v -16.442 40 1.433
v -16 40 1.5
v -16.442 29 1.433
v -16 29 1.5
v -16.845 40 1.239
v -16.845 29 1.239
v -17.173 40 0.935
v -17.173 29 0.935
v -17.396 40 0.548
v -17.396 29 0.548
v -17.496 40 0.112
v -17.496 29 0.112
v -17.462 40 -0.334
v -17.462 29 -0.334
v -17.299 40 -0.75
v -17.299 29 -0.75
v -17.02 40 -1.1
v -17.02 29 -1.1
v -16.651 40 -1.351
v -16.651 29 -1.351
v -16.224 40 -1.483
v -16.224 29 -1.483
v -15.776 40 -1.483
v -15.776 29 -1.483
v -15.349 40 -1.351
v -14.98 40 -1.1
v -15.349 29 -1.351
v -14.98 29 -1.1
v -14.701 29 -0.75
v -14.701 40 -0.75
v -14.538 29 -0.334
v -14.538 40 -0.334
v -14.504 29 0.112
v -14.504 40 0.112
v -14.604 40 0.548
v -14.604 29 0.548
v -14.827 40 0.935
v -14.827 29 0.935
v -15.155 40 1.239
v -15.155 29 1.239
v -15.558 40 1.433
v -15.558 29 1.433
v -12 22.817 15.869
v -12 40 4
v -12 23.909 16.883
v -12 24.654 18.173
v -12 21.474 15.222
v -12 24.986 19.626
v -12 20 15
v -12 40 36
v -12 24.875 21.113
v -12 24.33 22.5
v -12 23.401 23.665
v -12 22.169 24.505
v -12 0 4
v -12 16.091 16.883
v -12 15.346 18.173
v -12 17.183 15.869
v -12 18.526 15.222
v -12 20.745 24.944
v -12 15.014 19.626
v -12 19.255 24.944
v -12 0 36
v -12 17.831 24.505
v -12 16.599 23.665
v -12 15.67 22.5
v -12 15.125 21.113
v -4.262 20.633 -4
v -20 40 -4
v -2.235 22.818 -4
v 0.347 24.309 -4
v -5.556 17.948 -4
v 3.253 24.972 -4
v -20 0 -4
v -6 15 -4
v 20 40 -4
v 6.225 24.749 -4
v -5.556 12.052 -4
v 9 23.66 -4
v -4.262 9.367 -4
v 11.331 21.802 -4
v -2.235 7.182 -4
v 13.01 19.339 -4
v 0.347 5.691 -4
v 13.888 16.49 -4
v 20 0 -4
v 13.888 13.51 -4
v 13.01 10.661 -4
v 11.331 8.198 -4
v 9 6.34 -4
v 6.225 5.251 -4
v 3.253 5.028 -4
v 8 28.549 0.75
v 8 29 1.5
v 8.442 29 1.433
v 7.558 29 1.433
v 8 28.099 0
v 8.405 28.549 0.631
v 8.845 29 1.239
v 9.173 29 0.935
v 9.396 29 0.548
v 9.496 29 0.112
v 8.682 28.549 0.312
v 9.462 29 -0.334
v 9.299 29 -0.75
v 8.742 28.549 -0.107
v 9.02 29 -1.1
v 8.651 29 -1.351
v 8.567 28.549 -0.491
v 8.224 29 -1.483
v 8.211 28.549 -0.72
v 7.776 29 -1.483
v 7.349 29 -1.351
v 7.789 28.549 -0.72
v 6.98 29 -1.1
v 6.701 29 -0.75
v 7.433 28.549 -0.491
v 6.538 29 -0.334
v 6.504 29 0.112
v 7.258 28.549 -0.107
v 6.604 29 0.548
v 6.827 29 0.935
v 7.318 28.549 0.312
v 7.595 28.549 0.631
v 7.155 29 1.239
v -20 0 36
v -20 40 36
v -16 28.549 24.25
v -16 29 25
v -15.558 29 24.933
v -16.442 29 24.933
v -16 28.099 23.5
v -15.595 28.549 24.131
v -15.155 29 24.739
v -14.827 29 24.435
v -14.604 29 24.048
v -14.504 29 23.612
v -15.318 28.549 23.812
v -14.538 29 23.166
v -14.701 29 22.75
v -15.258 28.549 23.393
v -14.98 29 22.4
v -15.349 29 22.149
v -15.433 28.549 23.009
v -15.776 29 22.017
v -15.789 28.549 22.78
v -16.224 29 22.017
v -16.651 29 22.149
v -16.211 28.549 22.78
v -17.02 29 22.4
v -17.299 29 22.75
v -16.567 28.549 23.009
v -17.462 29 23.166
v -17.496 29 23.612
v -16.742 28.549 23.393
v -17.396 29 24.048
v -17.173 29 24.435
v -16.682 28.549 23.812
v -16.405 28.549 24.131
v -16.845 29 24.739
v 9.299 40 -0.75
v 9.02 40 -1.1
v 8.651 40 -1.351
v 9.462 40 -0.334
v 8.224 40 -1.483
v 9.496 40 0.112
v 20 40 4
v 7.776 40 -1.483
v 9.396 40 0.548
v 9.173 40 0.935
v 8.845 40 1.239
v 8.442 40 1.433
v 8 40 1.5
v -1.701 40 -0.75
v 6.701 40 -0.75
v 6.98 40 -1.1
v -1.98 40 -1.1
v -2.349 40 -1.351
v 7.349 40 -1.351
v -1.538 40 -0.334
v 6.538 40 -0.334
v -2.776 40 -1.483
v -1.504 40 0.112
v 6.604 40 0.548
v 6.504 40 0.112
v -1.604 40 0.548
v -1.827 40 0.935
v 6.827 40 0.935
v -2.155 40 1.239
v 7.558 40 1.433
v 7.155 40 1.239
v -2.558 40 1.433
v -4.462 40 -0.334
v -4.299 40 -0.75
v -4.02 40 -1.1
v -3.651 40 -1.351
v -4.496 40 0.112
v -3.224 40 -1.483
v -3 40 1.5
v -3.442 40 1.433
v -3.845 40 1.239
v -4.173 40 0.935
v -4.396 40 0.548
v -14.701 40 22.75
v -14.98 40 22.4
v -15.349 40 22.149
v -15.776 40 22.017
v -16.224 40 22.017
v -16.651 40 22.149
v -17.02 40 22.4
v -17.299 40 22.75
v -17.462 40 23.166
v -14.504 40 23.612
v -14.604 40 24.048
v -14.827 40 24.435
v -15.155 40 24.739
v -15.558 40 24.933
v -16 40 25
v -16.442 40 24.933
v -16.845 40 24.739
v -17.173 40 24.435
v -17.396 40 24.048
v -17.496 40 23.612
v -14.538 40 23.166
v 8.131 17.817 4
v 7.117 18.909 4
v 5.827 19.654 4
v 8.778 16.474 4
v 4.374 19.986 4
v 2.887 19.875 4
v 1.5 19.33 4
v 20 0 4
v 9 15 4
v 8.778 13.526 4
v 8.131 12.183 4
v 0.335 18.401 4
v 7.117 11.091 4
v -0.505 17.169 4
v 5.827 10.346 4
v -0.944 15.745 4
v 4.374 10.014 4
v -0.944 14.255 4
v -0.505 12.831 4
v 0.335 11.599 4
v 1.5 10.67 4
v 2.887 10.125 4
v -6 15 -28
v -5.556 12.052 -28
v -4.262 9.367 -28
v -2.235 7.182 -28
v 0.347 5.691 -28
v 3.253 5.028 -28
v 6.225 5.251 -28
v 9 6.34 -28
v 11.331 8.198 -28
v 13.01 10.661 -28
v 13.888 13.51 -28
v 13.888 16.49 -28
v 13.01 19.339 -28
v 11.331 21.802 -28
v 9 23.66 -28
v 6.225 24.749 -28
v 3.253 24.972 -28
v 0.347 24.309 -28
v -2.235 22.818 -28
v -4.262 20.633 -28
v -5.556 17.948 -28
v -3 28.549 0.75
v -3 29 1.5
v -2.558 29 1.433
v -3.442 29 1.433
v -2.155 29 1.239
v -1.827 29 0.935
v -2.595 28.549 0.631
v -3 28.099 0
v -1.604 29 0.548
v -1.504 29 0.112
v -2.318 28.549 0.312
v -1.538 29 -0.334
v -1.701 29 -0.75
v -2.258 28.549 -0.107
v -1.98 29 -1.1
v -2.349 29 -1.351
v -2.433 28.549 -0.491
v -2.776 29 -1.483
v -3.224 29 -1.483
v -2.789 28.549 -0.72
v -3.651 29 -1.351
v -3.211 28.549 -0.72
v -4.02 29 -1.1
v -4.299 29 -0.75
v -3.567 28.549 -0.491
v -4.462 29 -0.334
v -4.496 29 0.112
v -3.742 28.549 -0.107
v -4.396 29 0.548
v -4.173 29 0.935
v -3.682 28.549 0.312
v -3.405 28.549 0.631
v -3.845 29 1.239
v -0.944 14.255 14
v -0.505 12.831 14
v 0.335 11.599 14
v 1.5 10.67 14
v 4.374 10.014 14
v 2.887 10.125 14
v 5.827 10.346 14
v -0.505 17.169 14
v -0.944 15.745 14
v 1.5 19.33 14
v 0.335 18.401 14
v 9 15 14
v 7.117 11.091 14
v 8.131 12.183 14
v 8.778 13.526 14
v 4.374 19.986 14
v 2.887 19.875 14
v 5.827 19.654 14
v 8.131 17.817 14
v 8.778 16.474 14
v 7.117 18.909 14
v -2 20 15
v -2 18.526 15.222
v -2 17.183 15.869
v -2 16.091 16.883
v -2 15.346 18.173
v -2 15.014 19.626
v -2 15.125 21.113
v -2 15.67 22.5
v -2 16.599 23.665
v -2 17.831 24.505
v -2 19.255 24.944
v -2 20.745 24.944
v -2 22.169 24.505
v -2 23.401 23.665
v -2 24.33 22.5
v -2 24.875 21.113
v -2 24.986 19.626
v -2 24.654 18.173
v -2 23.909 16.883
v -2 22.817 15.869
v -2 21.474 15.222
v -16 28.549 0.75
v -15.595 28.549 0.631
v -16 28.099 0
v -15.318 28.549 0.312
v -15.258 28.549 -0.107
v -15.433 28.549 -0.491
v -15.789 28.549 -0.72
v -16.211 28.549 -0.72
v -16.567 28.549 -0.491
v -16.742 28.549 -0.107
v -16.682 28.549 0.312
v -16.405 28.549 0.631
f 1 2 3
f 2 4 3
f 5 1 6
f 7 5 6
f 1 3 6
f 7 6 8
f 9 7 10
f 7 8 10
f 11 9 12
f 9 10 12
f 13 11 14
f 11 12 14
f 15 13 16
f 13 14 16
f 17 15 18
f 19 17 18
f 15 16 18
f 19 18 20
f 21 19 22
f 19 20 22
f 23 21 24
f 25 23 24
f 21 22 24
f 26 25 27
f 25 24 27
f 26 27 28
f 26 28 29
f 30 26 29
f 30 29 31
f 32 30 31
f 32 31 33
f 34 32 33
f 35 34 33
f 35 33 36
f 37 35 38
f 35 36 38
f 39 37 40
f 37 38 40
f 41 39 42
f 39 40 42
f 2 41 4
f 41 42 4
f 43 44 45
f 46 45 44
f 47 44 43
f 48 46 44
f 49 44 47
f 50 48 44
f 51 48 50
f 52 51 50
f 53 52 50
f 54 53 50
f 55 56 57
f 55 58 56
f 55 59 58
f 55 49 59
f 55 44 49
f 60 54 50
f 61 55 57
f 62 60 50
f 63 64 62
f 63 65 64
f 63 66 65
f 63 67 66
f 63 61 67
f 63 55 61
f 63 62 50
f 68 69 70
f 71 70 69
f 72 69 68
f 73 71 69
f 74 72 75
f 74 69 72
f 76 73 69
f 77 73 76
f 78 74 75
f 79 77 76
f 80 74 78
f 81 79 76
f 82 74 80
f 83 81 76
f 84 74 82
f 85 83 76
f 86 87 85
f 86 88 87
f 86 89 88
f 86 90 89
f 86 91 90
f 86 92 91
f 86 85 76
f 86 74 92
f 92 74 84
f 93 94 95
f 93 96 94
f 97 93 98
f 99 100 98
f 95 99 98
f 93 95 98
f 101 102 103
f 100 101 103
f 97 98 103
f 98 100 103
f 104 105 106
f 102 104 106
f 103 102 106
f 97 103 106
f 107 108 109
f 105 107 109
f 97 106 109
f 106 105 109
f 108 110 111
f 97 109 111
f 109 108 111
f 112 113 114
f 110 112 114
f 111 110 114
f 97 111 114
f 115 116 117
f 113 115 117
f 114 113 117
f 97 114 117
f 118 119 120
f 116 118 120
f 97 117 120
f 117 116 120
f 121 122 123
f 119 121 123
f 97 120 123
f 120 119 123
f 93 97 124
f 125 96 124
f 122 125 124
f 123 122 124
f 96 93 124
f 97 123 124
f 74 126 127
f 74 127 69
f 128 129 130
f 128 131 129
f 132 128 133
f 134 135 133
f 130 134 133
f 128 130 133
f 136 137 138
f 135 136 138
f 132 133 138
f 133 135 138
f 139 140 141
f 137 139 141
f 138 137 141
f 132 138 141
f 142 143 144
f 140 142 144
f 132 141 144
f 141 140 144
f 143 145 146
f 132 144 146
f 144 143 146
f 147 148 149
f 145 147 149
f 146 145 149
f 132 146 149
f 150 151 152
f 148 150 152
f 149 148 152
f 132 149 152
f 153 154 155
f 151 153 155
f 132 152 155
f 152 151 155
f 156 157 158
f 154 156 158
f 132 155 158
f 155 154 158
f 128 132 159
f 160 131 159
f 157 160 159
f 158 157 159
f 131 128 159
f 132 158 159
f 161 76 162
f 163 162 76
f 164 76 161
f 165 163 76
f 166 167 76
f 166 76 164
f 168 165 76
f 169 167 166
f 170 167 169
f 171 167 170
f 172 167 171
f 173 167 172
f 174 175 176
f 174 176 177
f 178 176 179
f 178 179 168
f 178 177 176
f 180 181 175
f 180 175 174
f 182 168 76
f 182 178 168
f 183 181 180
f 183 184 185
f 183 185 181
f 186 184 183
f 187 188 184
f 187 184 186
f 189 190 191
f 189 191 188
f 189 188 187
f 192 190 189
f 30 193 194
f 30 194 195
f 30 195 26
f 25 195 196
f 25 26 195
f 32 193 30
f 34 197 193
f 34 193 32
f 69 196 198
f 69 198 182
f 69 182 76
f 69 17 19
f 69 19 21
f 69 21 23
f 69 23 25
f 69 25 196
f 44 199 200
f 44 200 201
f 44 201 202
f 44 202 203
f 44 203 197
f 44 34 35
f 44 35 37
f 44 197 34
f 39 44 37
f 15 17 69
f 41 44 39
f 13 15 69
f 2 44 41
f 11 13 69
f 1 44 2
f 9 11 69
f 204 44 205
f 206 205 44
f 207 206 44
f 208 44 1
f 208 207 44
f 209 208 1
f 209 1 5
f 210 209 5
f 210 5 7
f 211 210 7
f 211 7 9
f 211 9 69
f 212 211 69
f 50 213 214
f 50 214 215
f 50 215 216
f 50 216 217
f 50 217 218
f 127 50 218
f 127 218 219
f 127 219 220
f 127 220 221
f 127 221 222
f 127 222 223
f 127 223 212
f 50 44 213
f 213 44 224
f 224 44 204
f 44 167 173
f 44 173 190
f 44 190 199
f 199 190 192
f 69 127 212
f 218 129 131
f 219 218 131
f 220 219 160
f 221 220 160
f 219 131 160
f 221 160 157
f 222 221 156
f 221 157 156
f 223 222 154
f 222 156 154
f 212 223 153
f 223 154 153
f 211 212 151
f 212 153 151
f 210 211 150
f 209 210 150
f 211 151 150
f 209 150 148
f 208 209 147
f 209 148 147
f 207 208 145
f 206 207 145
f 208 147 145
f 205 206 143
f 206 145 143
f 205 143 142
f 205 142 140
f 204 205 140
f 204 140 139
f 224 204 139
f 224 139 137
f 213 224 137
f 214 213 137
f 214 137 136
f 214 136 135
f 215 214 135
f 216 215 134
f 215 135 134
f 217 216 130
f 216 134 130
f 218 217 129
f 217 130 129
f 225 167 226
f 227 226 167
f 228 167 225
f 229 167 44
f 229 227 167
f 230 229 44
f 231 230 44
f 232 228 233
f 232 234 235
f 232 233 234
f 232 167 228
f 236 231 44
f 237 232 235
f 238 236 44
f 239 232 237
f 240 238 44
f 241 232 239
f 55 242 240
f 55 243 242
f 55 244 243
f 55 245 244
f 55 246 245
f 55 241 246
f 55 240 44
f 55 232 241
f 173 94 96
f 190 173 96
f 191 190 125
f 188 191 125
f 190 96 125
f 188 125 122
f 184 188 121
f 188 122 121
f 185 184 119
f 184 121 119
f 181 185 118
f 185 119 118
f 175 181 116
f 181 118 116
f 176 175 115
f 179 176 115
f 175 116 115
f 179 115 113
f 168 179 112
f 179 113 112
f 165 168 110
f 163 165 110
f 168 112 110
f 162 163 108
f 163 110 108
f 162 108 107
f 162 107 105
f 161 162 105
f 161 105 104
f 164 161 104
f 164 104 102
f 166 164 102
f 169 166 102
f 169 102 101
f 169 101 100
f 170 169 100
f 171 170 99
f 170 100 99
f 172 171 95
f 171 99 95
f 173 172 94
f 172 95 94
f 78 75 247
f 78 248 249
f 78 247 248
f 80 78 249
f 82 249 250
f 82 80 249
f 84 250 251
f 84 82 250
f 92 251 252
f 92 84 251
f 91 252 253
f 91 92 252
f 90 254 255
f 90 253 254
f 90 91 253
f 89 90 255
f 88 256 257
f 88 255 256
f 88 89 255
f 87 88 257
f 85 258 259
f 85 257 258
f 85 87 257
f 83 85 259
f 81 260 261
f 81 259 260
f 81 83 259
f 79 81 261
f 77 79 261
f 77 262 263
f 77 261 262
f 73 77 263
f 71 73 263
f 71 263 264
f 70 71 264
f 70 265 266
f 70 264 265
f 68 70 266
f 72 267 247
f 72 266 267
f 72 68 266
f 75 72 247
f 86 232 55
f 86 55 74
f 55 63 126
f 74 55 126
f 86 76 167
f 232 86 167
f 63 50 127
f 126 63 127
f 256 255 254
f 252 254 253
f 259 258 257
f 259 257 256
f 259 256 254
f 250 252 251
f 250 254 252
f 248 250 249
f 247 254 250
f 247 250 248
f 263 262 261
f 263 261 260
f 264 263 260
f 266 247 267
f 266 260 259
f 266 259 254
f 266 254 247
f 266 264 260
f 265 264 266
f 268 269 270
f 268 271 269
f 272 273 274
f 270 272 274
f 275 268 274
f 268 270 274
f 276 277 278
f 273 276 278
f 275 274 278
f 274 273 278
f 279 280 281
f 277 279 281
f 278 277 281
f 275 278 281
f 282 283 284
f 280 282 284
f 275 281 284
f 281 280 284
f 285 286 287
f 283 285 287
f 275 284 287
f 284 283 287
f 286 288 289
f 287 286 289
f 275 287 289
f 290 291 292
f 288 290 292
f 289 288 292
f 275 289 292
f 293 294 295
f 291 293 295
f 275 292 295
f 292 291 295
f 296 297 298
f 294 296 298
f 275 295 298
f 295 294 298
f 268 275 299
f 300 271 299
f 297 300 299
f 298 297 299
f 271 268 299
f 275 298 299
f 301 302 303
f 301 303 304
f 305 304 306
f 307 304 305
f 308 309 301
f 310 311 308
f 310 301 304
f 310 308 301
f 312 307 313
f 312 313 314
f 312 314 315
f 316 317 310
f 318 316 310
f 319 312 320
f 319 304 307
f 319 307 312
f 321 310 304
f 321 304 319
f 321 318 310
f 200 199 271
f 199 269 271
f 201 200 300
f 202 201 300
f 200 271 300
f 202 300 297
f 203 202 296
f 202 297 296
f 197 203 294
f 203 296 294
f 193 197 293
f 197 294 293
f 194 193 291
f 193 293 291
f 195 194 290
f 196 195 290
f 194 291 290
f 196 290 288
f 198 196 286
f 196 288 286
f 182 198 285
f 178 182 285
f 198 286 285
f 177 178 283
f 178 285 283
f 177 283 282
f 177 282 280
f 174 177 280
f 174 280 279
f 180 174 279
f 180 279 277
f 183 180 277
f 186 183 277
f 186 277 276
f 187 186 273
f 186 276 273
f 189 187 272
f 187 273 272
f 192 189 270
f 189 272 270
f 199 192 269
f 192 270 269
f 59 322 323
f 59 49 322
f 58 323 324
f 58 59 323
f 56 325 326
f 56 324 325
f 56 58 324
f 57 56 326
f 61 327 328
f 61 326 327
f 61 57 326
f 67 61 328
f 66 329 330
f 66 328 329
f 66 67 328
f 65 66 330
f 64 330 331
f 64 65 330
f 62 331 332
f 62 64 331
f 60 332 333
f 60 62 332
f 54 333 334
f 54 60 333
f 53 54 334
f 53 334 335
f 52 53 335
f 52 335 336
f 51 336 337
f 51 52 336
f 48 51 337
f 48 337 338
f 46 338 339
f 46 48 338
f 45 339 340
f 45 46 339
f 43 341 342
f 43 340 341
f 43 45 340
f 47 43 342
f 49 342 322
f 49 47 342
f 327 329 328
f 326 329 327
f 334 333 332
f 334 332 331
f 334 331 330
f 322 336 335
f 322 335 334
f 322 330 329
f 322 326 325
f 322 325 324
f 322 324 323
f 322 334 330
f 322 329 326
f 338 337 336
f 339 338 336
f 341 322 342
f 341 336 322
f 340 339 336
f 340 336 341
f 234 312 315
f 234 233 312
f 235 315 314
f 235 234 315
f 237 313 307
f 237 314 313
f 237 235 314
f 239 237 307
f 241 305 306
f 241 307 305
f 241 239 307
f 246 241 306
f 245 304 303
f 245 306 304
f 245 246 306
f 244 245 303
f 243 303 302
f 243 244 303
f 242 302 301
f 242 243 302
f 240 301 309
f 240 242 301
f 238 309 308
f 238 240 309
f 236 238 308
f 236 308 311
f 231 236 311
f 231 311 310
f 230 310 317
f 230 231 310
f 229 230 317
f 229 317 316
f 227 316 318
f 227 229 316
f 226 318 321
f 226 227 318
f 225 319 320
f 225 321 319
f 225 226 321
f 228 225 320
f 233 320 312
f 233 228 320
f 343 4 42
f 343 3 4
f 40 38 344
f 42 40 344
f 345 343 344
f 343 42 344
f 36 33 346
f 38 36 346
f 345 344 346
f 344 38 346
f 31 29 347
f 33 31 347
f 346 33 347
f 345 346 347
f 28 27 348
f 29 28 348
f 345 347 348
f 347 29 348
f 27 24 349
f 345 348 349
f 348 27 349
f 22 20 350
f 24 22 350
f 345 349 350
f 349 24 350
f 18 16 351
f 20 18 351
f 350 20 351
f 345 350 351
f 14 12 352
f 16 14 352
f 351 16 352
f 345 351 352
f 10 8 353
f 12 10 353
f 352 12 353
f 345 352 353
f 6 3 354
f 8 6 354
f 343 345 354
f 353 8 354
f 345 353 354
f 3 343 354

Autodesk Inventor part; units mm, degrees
ref_plane "YZ Plane" through (0, 0, 0) normal (1, 0, 0) x (0, 1, 0)
ref_plane "XZ Plane" through (0, 0, 0) normal (0, 1, 0) x (-1, 0, 0)
ref_plane "XY Plane" through (0, 0, 0) normal (0, 0, 1) x (1, 0, 0)
sketch "Sketch1" plane through (0, 0, 0) normal (0, 1, 0) x (-1, 0, 0)
  line L0 (-20, 4) -> (20, 4)
  line L1 (20, 4) -> (20, -4)
  line L2 (20, -4) -> (-20, -4)
  line L3 (-20, -4) -> (-20, 4)
  line L4 (-20, 4) -> (20, -4) construction
  line L5 (20, 4) -> (-20, -4) construction
  line L6 (20, -4) -> (12, -4)
  line L7 (12, -4) -> (12, 36)
  line L8 (12, 36) -> (20, 36)
  line L9 (20, 36) -> (20, -4)
  point P0 (0, 0)
  point P1 (12, 4)
  dimension "d0" = 40
  dimension "d1" = 8
  dimension "d2" = 8
  dimension "d3" = 40
extrude "Extrusion1" add sketch "Sketch1" along normal blind 40
sketch "Sketch2" plane through (0, 40, 0) normal (0, 1, 0) x (1, 0, 0)
  circle A0 centre (8, 0) radius 2.5
  circle A1 centre (-3, 0) radius 2.5
  circle A2 centre (-16, 0) radius 2.5
  circle A3 centre (-16, -23.5) radius 2.5
  line L0 (20, -4) -> (20, 4) projected
  line L1 (-20, -36) -> (-12, -36) projected
  point P0 (0, 0)
  point P1 (-16, -36)
  point P2 (-16, -36)
  point P3 (20, 0)
  point P4 (-16, -36)
  point P5 (20, 0)
  dimension "d6" = 5
  dimension "d7" = 5
  dimension "d8" = 5
  dimension "d9" = 5
  dimension "d10" = 12
  dimension "d21" = 12.5
  dimension "d22" = 23
hole "Hole1" at (-16, 40, 23.5) at (-16, 40, 0) at (-3, 40, 0) at (8, 40, 0) direction (0, -1, 0) diameter 3 depth 11 tip angle 118
sketch "Sketch3" plane through (-12, 0, 36) normal (1, 0, 0) x (0, 0, -1)
  circle A0 centre (16, 20) radius 5
  line L0 (0, 0) -> (0, 40) projected
  point P0 (36, 0)
  dimension "d23" = 10
  dimension "d31" = 16
extrude "Extrusion2" add sketch "Sketch3" along normal blind 10
sketch "Sketch4" plane through (-12, 0, 4) normal (0, 0, 1) x (1, 0, 0)
  circle A0 centre (16, 15) radius 5
  line L0 (0, 0) -> (32, 0) projected
  line L1 (32, 0) -> (32, 40) projected
  point P0 (12, 0)
  dimension "d26" = 10
  dimension "d27" = 15
  dimension "d28" = 16
extrude "Extrusion3" add sketch "Sketch4" along normal blind 10
sketch "Sketch5" plane through (20, 0, -4) normal (0, 0, -1) x (-1, 0, 0)
  circle A0 centre (16, 15) radius 5 projected
  circle A1 centre (16, 15) radius 10
  point P0 (20, 0)
  dimension "d32" = 20
extrude "Extrusion4" add sketch "Sketch5" along normal blind 24 contours A0 | A1
equation "\"d19\" = d11"
equation "\"d11\" = 11"
properties part number "Non-ThorLabs Galvo"
